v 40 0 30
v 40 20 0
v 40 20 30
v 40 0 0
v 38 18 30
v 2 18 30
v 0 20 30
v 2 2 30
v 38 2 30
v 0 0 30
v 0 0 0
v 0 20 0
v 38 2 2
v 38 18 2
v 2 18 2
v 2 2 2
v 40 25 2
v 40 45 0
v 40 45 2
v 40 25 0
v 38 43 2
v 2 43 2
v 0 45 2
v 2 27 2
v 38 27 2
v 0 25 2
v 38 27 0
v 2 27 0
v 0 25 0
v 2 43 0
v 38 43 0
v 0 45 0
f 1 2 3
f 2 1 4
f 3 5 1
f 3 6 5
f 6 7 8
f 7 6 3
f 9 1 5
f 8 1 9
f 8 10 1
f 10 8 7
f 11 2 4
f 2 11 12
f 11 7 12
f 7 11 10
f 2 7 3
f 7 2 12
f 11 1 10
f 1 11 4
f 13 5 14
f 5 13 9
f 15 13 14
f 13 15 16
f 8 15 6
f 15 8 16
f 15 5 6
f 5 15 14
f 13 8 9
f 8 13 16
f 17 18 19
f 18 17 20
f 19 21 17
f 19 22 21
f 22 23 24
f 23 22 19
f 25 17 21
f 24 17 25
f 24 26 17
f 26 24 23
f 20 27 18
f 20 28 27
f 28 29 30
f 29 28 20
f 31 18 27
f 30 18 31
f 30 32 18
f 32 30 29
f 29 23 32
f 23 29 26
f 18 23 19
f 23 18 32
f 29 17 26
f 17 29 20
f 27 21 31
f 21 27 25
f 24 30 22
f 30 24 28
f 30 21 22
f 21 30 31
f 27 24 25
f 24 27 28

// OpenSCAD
// Parametric box with lid (simplified - no variables)
union() {
    // Box
    difference() {
        cube([40, 20, 30]);
        translate([2, 2, 2]) 
            cube([36, 16, 28]);
    }
    
    // Lid
    translate([0, 25, 0]) {
        difference() {
            cube([40, 20, 2]);
            translate([2, 2, -1]) 
                cube([36, 16, 4]);
        }
    }
}
